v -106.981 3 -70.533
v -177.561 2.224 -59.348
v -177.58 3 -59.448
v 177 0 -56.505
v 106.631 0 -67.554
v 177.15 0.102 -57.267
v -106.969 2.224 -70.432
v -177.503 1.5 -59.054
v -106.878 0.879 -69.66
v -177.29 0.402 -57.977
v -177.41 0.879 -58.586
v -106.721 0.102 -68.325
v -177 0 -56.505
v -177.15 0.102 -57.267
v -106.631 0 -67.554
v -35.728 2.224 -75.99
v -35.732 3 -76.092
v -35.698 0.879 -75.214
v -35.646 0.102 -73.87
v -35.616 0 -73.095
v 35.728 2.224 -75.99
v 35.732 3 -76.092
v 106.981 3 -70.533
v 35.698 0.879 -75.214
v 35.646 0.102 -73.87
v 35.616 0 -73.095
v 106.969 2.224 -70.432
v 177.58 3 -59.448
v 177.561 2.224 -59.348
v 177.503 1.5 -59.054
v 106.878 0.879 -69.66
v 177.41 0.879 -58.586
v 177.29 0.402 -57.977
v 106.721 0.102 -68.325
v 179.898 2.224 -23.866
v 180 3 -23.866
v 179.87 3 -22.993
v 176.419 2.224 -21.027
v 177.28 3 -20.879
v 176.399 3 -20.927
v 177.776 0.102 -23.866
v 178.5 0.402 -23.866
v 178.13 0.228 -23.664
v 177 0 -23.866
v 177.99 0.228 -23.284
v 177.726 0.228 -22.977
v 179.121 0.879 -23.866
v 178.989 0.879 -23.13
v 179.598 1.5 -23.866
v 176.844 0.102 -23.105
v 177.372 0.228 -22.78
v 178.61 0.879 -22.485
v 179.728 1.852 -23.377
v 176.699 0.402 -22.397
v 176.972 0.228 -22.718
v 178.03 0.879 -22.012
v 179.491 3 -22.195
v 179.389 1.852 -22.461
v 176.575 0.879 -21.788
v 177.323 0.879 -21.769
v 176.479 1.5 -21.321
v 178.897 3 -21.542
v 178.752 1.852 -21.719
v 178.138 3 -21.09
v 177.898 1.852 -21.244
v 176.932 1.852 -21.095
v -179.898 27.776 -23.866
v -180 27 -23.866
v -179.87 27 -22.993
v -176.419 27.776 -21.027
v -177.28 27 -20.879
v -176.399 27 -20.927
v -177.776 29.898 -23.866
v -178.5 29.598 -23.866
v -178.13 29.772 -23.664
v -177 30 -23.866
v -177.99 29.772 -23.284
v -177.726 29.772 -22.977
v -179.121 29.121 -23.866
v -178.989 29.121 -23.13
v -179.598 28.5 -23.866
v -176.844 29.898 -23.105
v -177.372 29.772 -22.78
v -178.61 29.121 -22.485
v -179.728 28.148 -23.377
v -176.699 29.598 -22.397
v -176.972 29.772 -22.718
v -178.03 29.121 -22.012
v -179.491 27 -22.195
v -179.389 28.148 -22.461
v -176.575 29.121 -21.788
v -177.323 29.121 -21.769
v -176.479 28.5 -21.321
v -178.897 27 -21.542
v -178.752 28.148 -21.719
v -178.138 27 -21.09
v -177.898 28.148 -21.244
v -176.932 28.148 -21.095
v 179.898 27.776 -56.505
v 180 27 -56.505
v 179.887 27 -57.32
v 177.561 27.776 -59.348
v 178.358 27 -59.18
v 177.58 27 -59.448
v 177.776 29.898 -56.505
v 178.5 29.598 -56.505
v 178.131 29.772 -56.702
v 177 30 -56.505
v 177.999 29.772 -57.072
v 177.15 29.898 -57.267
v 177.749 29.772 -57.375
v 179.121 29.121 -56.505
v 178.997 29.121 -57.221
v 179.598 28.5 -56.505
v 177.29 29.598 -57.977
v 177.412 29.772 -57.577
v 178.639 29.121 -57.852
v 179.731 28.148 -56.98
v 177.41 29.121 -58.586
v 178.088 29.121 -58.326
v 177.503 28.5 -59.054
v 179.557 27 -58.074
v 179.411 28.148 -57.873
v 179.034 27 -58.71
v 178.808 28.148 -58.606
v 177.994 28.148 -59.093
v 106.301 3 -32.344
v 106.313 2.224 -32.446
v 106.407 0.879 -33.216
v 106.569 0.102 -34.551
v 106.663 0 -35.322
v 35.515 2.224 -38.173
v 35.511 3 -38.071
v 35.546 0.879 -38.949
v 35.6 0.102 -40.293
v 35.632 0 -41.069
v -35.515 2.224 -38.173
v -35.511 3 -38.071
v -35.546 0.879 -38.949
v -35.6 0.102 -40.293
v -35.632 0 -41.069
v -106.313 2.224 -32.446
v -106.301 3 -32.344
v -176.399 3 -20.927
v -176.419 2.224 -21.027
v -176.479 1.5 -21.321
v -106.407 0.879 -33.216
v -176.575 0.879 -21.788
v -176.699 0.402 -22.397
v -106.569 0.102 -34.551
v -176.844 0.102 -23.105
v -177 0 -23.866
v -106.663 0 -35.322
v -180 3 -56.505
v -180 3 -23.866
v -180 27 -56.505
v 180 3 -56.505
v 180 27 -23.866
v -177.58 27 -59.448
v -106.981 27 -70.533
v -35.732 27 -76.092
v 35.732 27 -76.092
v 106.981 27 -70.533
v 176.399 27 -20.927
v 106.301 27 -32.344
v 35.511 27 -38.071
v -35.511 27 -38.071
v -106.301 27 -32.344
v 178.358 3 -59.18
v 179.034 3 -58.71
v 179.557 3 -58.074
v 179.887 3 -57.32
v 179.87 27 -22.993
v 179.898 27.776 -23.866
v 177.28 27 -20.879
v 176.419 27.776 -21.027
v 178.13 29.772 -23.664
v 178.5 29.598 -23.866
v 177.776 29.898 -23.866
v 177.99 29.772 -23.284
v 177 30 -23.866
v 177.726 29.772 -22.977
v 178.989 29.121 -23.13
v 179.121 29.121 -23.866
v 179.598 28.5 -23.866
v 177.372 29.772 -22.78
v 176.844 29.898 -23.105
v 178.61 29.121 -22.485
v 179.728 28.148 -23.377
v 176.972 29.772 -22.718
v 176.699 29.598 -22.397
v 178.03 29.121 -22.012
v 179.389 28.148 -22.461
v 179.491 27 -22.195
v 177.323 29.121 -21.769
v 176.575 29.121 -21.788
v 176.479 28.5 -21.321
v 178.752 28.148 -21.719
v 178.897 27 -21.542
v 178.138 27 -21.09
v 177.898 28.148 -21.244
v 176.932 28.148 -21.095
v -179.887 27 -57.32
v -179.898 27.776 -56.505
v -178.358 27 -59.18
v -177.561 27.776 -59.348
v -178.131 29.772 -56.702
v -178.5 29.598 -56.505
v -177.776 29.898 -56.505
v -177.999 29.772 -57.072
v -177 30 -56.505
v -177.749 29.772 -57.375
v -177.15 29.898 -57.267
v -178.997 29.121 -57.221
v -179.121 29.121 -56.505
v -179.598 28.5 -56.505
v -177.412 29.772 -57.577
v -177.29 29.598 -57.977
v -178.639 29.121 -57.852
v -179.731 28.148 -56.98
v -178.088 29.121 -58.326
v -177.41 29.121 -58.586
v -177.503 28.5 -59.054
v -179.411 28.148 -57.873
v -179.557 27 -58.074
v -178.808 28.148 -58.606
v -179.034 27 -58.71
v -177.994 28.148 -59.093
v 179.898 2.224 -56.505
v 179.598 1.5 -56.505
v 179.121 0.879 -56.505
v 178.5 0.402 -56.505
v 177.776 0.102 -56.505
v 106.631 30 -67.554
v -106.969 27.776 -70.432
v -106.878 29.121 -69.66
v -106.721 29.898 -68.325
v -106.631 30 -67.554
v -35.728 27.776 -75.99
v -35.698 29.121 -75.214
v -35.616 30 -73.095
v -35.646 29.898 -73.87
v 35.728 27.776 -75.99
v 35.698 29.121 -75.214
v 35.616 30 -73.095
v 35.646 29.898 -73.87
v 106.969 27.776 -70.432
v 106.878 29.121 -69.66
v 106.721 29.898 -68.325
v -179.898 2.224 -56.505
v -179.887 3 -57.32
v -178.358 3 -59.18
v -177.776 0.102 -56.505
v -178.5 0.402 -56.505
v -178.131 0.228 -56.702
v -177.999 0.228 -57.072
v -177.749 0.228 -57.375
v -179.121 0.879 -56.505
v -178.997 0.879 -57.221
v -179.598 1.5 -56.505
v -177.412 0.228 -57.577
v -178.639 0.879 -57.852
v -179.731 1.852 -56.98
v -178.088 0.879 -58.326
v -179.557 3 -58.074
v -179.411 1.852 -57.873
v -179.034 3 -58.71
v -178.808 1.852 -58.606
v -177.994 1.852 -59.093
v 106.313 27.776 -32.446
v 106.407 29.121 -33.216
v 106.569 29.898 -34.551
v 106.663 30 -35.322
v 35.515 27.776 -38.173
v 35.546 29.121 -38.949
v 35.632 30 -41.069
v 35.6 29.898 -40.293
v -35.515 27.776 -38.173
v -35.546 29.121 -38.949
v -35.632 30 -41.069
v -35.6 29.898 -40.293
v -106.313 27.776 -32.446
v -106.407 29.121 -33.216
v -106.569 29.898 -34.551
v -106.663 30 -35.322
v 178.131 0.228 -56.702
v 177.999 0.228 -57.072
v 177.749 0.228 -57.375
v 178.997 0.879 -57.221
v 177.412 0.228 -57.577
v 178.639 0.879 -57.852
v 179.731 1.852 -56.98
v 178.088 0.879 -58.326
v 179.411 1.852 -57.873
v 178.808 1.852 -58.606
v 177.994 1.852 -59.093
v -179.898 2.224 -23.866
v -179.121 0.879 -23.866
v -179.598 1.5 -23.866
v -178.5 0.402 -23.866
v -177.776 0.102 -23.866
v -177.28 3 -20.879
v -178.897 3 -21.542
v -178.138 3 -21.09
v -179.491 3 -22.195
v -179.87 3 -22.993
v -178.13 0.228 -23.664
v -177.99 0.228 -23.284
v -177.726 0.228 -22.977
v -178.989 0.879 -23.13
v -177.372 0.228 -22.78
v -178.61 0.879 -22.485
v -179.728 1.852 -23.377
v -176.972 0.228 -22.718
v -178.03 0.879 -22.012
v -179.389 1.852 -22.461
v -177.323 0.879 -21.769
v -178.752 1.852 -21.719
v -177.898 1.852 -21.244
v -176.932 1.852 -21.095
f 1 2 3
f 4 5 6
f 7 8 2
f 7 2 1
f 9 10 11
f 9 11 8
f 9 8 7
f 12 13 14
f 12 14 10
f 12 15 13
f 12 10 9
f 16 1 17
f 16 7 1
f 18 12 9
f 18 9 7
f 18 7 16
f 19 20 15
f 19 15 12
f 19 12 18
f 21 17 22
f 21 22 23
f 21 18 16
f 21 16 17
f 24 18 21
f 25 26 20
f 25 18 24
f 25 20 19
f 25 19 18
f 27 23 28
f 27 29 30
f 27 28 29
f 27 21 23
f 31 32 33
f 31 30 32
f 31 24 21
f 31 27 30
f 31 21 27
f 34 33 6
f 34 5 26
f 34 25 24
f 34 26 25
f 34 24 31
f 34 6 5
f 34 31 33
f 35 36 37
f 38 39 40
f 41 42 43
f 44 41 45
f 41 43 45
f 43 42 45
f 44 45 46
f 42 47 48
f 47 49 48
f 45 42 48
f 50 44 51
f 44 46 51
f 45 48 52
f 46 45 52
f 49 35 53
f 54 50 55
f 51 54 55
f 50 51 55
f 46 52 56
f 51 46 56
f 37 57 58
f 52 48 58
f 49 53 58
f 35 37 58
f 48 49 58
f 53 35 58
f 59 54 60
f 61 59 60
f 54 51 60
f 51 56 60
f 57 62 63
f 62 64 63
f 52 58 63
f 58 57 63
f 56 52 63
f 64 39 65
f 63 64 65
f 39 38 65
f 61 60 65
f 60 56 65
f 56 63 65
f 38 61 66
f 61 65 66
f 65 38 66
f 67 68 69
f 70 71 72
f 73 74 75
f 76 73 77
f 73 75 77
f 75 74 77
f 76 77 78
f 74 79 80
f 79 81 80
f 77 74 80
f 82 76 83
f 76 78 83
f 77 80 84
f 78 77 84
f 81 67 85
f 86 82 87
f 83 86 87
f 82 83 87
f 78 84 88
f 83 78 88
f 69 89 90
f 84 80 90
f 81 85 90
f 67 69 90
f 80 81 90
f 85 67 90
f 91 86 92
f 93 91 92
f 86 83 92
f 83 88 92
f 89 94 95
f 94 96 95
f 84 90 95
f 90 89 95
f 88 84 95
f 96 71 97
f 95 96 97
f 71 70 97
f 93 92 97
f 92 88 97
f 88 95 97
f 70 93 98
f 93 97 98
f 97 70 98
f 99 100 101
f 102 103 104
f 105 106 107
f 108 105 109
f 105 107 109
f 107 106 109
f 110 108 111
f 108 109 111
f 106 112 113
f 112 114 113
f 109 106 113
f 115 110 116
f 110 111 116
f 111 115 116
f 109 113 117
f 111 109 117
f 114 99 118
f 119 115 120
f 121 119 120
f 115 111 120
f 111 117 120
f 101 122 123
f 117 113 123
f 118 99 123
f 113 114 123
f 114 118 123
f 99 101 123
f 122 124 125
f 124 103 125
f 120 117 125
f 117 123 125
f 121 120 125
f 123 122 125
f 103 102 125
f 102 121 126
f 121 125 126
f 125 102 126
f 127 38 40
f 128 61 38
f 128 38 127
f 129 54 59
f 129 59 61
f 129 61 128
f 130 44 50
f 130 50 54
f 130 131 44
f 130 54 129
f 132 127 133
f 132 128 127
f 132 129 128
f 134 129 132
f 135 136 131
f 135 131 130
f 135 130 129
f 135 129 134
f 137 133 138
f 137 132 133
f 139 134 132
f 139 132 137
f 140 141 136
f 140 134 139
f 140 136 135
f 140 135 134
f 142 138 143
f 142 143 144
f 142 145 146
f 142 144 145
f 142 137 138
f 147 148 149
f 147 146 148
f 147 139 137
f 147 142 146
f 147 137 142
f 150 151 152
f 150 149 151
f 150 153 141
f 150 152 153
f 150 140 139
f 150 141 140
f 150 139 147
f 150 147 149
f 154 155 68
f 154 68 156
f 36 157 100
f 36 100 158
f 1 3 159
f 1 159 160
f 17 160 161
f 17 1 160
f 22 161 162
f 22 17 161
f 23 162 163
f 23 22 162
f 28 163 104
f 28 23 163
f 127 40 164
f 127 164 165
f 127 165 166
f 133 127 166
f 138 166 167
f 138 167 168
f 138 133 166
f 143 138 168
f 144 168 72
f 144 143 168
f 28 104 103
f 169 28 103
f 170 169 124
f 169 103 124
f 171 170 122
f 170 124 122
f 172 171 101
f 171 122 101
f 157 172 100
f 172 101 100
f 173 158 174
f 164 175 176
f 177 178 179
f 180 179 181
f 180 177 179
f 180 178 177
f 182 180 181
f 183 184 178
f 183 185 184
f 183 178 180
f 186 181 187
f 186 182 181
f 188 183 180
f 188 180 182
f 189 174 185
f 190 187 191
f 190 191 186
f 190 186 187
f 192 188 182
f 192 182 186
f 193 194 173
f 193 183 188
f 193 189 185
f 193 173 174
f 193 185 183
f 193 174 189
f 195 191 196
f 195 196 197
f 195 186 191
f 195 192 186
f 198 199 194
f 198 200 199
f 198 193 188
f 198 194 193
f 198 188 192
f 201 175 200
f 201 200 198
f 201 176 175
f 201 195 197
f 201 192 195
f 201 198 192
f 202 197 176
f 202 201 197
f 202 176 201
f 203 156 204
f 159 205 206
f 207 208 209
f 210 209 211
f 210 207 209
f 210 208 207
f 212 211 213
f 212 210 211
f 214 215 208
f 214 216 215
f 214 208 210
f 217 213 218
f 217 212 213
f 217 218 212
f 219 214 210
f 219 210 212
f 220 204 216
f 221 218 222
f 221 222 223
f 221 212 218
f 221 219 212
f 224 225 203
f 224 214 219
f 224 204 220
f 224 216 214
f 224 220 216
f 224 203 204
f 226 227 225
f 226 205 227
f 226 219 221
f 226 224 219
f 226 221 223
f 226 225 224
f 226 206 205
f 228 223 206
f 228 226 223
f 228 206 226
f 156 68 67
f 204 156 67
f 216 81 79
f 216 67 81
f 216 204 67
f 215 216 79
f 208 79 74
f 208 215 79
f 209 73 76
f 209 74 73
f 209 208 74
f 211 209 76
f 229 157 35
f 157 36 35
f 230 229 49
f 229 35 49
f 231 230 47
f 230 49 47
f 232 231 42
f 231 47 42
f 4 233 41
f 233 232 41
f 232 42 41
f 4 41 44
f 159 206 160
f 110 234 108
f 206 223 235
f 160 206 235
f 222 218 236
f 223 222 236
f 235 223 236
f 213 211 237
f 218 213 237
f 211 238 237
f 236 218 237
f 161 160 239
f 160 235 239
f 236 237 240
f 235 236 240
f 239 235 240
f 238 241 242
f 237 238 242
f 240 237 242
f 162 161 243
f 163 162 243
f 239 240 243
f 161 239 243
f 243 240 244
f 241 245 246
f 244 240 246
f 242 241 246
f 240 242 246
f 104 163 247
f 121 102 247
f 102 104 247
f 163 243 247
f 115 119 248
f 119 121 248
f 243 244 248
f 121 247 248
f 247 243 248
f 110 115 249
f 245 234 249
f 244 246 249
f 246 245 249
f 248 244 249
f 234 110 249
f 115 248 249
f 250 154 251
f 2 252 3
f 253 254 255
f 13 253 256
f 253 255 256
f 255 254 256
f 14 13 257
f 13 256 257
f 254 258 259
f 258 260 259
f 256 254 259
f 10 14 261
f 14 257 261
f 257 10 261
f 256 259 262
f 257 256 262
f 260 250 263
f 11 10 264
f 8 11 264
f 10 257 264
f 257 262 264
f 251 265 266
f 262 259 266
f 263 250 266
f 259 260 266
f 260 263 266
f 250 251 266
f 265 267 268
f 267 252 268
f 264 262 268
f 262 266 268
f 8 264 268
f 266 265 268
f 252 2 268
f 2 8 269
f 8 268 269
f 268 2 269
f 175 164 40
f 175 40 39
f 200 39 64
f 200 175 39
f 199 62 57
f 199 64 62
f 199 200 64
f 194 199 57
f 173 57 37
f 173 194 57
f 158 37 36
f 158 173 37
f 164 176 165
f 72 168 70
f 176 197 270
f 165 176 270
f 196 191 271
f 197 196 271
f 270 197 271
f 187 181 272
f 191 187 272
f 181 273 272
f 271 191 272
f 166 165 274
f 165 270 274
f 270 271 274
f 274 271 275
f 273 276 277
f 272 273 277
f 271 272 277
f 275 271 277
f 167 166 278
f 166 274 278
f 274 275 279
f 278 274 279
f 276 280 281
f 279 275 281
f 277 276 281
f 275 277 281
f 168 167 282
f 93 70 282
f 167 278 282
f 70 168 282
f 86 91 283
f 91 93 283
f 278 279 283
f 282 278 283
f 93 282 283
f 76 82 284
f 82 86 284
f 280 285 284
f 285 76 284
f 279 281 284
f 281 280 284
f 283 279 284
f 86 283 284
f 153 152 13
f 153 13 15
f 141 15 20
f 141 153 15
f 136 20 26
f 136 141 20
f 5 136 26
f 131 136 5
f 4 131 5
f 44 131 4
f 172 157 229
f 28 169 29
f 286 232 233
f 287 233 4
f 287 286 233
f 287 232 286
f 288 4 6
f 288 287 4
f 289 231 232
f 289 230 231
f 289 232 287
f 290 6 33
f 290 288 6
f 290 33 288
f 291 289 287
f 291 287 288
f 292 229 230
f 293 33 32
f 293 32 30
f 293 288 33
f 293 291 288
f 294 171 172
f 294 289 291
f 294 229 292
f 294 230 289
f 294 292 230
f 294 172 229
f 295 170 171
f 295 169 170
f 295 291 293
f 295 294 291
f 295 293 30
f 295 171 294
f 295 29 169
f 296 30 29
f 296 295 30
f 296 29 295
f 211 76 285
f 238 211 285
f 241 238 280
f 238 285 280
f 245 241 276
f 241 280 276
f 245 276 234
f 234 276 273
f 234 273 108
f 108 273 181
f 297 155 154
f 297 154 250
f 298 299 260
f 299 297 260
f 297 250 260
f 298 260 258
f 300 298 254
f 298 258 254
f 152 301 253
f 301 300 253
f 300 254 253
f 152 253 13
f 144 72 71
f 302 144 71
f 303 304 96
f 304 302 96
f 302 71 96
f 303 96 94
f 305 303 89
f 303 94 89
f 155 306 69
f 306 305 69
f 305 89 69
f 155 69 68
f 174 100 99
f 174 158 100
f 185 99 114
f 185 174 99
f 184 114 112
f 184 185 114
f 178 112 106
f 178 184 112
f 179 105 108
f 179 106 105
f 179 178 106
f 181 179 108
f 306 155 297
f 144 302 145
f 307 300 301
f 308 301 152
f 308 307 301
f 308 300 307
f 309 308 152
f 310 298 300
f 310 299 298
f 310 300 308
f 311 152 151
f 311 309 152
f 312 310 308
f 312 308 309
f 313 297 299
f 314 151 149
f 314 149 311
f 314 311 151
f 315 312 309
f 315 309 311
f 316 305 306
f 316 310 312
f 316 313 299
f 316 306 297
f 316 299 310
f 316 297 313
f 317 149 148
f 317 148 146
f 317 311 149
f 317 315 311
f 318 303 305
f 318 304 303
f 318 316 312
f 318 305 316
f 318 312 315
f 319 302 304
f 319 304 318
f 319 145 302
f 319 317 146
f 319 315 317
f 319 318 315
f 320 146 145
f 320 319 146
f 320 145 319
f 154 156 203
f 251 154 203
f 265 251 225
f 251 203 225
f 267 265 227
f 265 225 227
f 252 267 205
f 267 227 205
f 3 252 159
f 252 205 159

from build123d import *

# Parameters (mm, degrees)
F1_DEPTH = 30
F2_R     = 3


with BuildPart() as f1:
    # F0 (on Front) → F1 (new body)
    with BuildSketch(Plane.XZ):
        with BuildLine():
            ThreePointArc((180, -20.182252), (0, -38.788033), (-180, -20.182252))
            Line((-180, -20.182252), (-180, -58.968014))
            ThreePointArc((-180, -58.968014), (0, -76.788032), (180, -58.968014))
            Line((180, -58.968014), (180, -20.182252))
        make_face()
    extrude(amount=-F1_DEPTH)

    # F2
    f2_edges = [f1.edges().sort_by_distance(p)[0] for p in [
        (-180, 15, -20.182252),
        (-180, 15, -58.968014),
        (-180, 0, -39.575133),
        (-180, 30, -39.575133),
        (180, 15, -58.968014),
        (180, 15, -20.182252),
        (180, 0, -39.575133),
        (180, 30, -39.575133),
        (0, 0, -38.788033),
        (0, 30, -38.788033),
        (0, 0, -76.788032),
        (0, 30, -76.788032),
    ]]
    fillet(f2_edges, radius=F2_R)


solid = f1.part
